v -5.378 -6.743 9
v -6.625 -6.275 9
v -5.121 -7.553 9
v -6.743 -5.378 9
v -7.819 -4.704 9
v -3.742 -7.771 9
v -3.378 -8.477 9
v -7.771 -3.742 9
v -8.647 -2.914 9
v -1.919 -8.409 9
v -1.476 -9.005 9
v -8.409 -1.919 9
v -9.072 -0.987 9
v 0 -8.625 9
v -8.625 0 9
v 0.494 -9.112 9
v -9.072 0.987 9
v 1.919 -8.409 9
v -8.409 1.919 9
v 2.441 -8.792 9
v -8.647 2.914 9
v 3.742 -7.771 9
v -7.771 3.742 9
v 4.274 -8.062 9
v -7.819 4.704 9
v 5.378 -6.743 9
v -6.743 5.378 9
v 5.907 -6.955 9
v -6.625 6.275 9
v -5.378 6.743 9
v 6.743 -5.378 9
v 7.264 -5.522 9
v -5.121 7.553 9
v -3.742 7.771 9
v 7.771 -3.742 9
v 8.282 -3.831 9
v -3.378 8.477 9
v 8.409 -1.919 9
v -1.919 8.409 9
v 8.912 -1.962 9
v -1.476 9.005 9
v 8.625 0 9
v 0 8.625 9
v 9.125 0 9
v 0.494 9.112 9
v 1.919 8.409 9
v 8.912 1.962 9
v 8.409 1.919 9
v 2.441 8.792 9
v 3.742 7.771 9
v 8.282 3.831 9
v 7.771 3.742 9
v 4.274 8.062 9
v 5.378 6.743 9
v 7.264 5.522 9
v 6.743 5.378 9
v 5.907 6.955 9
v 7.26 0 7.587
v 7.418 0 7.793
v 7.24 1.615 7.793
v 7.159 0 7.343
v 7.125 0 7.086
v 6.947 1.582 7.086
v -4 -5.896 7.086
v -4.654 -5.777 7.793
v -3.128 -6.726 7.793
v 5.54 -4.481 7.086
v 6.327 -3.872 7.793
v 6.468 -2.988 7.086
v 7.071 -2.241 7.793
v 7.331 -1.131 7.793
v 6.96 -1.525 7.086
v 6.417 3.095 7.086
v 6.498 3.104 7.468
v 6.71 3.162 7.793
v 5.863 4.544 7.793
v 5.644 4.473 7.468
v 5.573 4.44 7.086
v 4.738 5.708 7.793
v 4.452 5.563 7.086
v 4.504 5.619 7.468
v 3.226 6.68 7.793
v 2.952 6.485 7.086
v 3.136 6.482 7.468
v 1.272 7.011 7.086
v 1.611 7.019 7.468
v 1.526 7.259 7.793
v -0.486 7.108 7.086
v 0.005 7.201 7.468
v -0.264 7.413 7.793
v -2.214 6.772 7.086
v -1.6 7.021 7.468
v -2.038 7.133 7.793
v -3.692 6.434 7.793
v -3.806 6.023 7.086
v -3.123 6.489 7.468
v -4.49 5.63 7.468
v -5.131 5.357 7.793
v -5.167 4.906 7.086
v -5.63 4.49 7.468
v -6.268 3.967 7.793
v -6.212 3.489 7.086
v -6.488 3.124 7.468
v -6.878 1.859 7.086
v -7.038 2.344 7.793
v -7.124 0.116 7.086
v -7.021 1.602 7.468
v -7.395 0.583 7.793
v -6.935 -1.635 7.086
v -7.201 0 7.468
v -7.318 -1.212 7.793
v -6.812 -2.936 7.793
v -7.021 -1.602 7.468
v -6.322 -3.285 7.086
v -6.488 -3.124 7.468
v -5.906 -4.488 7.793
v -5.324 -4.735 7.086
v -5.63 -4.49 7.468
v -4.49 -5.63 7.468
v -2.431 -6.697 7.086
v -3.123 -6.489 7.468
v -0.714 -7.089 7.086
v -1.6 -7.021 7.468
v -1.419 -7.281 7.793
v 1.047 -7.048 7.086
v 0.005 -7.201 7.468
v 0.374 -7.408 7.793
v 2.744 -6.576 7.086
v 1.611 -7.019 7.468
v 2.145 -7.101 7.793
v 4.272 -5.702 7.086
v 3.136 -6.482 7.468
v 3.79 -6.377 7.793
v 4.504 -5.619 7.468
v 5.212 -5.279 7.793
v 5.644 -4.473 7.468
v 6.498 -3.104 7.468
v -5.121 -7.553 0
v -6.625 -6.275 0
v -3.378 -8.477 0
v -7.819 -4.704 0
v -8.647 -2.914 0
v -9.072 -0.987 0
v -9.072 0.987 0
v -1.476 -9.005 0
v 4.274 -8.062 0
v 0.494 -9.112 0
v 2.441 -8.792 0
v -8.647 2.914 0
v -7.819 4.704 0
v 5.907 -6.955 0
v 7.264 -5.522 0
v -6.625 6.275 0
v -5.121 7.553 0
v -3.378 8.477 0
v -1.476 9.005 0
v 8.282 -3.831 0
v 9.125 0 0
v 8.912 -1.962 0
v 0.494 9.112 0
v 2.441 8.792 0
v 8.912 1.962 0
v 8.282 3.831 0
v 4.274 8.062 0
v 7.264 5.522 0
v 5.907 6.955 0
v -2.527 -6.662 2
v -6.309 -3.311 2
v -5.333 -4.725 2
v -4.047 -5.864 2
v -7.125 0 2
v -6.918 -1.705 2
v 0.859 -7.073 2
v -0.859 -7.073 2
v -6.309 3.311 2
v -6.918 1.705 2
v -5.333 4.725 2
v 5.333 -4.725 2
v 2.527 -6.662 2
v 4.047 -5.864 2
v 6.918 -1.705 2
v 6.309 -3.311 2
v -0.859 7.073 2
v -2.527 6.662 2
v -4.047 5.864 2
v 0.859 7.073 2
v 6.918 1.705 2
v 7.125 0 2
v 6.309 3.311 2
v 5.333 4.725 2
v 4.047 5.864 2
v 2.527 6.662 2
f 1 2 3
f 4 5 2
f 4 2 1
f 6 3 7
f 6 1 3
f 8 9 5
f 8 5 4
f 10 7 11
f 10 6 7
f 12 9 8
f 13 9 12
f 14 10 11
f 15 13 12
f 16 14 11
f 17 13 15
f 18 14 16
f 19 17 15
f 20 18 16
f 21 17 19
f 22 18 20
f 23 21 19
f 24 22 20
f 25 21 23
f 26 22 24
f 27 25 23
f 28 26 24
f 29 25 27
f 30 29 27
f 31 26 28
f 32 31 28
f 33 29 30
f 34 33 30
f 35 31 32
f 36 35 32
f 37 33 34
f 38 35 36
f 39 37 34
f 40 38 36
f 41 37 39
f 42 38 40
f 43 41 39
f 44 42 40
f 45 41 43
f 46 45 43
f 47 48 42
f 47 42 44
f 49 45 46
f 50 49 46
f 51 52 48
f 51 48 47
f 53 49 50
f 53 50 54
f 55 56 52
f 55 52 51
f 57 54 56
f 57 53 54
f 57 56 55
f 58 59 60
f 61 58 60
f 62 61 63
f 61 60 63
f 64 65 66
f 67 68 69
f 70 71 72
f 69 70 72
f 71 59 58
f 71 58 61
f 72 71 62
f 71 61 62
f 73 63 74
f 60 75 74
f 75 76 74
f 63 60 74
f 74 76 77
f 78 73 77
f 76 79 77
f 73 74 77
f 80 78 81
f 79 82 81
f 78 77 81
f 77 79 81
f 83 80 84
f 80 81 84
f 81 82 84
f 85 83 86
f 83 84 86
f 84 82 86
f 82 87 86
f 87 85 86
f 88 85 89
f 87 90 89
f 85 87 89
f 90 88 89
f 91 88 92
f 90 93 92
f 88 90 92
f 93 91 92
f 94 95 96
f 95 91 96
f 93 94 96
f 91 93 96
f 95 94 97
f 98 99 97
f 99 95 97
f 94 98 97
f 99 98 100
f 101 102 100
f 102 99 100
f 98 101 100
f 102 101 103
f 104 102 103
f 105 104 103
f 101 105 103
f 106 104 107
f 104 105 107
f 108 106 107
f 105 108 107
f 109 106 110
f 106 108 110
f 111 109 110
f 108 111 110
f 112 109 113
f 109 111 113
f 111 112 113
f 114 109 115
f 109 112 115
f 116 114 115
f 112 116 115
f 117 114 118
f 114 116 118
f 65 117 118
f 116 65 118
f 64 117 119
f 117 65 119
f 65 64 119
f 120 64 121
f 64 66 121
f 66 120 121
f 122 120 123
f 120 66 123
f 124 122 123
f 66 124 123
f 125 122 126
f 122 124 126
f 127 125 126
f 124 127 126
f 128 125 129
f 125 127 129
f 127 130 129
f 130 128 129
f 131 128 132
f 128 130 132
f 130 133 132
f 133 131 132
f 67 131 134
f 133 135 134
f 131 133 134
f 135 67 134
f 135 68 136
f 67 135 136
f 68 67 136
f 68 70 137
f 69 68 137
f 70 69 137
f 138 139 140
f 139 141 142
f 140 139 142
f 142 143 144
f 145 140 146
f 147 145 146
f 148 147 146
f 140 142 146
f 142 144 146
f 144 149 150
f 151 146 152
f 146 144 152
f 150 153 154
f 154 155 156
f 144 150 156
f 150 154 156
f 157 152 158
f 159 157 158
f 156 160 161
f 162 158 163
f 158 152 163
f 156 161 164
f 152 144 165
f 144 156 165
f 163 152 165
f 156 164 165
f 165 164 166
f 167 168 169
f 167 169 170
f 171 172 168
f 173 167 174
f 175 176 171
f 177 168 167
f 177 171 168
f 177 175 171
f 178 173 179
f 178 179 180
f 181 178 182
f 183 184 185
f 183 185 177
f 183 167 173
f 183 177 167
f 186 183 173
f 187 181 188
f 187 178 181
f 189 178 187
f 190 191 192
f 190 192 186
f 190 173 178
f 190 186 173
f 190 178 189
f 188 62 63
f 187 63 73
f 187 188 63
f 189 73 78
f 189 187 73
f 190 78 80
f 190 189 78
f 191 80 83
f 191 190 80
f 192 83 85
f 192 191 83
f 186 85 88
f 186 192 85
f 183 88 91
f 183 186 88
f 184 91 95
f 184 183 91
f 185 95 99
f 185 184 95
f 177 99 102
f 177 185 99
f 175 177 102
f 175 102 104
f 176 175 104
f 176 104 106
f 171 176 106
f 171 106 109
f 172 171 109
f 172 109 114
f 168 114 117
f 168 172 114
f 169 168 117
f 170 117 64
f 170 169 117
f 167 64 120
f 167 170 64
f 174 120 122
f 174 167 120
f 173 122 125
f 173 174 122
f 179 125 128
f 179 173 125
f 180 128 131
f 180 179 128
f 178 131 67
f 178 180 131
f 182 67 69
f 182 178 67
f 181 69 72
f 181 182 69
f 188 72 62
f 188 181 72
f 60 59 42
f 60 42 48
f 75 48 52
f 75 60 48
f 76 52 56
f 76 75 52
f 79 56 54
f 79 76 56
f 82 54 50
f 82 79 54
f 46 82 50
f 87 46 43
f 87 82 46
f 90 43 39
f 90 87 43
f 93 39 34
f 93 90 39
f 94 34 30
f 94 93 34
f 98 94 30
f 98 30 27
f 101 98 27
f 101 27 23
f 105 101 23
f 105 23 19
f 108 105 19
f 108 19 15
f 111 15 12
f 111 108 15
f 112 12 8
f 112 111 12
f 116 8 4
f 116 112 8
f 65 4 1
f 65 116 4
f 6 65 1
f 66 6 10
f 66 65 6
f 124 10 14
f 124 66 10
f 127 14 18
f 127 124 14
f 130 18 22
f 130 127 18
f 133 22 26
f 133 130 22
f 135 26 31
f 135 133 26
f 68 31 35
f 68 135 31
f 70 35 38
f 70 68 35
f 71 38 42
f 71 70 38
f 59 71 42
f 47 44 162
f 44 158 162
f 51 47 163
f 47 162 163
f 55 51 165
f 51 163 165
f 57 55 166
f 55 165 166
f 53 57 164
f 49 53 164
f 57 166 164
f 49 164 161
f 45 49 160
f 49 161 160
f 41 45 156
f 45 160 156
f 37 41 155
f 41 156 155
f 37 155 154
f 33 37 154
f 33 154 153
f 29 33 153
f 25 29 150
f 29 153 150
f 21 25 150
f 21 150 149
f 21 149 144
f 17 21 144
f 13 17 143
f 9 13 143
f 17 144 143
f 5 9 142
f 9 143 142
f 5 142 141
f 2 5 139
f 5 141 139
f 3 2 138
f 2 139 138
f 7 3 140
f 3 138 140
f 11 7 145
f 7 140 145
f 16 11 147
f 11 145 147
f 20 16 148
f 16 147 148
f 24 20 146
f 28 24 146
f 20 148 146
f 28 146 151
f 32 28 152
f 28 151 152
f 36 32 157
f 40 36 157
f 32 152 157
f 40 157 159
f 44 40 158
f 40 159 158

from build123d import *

# Parameters (mm, degrees)
SKETCH_R      = 9.125
PAD_DEPTH     = 2
SKETCH001_R   = 9.125
SKETCH001_R_2 = 7.125
PAD001_DEPTH  = 7
CHAMFER_SIZE  = 1.5
FILLET_R      = 1


with BuildPart() as part:
    # Sketch → Pad (new body)
    with BuildSketch(Plane.XY):
        Circle(SKETCH_R)
    extrude(amount=PAD_DEPTH)

    # Sketch001 (on Face3 of Pad) → Pad001 (join)
    with BuildSketch(Plane.XY.offset(2)):
        Circle(SKETCH001_R)
        Circle(SKETCH001_R_2, mode=Mode.SUBTRACT)
    extrude(amount=PAD001_DEPTH)

    # Chamfer
    chamfer_edges = [part.edges().sort_by_distance(p)[0] for p in [
        (-7.125, 0, 9),
    ]]
    chamfer(chamfer_edges, length=CHAMFER_SIZE)

    # Fillet
    fillet_edges = [part.edges().sort_by_distance(p)[0] for p in [
        (-7.125, 0, 7.5),
    ]]
    fillet(fillet_edges, radius=FILLET_R)


solid = part.part
